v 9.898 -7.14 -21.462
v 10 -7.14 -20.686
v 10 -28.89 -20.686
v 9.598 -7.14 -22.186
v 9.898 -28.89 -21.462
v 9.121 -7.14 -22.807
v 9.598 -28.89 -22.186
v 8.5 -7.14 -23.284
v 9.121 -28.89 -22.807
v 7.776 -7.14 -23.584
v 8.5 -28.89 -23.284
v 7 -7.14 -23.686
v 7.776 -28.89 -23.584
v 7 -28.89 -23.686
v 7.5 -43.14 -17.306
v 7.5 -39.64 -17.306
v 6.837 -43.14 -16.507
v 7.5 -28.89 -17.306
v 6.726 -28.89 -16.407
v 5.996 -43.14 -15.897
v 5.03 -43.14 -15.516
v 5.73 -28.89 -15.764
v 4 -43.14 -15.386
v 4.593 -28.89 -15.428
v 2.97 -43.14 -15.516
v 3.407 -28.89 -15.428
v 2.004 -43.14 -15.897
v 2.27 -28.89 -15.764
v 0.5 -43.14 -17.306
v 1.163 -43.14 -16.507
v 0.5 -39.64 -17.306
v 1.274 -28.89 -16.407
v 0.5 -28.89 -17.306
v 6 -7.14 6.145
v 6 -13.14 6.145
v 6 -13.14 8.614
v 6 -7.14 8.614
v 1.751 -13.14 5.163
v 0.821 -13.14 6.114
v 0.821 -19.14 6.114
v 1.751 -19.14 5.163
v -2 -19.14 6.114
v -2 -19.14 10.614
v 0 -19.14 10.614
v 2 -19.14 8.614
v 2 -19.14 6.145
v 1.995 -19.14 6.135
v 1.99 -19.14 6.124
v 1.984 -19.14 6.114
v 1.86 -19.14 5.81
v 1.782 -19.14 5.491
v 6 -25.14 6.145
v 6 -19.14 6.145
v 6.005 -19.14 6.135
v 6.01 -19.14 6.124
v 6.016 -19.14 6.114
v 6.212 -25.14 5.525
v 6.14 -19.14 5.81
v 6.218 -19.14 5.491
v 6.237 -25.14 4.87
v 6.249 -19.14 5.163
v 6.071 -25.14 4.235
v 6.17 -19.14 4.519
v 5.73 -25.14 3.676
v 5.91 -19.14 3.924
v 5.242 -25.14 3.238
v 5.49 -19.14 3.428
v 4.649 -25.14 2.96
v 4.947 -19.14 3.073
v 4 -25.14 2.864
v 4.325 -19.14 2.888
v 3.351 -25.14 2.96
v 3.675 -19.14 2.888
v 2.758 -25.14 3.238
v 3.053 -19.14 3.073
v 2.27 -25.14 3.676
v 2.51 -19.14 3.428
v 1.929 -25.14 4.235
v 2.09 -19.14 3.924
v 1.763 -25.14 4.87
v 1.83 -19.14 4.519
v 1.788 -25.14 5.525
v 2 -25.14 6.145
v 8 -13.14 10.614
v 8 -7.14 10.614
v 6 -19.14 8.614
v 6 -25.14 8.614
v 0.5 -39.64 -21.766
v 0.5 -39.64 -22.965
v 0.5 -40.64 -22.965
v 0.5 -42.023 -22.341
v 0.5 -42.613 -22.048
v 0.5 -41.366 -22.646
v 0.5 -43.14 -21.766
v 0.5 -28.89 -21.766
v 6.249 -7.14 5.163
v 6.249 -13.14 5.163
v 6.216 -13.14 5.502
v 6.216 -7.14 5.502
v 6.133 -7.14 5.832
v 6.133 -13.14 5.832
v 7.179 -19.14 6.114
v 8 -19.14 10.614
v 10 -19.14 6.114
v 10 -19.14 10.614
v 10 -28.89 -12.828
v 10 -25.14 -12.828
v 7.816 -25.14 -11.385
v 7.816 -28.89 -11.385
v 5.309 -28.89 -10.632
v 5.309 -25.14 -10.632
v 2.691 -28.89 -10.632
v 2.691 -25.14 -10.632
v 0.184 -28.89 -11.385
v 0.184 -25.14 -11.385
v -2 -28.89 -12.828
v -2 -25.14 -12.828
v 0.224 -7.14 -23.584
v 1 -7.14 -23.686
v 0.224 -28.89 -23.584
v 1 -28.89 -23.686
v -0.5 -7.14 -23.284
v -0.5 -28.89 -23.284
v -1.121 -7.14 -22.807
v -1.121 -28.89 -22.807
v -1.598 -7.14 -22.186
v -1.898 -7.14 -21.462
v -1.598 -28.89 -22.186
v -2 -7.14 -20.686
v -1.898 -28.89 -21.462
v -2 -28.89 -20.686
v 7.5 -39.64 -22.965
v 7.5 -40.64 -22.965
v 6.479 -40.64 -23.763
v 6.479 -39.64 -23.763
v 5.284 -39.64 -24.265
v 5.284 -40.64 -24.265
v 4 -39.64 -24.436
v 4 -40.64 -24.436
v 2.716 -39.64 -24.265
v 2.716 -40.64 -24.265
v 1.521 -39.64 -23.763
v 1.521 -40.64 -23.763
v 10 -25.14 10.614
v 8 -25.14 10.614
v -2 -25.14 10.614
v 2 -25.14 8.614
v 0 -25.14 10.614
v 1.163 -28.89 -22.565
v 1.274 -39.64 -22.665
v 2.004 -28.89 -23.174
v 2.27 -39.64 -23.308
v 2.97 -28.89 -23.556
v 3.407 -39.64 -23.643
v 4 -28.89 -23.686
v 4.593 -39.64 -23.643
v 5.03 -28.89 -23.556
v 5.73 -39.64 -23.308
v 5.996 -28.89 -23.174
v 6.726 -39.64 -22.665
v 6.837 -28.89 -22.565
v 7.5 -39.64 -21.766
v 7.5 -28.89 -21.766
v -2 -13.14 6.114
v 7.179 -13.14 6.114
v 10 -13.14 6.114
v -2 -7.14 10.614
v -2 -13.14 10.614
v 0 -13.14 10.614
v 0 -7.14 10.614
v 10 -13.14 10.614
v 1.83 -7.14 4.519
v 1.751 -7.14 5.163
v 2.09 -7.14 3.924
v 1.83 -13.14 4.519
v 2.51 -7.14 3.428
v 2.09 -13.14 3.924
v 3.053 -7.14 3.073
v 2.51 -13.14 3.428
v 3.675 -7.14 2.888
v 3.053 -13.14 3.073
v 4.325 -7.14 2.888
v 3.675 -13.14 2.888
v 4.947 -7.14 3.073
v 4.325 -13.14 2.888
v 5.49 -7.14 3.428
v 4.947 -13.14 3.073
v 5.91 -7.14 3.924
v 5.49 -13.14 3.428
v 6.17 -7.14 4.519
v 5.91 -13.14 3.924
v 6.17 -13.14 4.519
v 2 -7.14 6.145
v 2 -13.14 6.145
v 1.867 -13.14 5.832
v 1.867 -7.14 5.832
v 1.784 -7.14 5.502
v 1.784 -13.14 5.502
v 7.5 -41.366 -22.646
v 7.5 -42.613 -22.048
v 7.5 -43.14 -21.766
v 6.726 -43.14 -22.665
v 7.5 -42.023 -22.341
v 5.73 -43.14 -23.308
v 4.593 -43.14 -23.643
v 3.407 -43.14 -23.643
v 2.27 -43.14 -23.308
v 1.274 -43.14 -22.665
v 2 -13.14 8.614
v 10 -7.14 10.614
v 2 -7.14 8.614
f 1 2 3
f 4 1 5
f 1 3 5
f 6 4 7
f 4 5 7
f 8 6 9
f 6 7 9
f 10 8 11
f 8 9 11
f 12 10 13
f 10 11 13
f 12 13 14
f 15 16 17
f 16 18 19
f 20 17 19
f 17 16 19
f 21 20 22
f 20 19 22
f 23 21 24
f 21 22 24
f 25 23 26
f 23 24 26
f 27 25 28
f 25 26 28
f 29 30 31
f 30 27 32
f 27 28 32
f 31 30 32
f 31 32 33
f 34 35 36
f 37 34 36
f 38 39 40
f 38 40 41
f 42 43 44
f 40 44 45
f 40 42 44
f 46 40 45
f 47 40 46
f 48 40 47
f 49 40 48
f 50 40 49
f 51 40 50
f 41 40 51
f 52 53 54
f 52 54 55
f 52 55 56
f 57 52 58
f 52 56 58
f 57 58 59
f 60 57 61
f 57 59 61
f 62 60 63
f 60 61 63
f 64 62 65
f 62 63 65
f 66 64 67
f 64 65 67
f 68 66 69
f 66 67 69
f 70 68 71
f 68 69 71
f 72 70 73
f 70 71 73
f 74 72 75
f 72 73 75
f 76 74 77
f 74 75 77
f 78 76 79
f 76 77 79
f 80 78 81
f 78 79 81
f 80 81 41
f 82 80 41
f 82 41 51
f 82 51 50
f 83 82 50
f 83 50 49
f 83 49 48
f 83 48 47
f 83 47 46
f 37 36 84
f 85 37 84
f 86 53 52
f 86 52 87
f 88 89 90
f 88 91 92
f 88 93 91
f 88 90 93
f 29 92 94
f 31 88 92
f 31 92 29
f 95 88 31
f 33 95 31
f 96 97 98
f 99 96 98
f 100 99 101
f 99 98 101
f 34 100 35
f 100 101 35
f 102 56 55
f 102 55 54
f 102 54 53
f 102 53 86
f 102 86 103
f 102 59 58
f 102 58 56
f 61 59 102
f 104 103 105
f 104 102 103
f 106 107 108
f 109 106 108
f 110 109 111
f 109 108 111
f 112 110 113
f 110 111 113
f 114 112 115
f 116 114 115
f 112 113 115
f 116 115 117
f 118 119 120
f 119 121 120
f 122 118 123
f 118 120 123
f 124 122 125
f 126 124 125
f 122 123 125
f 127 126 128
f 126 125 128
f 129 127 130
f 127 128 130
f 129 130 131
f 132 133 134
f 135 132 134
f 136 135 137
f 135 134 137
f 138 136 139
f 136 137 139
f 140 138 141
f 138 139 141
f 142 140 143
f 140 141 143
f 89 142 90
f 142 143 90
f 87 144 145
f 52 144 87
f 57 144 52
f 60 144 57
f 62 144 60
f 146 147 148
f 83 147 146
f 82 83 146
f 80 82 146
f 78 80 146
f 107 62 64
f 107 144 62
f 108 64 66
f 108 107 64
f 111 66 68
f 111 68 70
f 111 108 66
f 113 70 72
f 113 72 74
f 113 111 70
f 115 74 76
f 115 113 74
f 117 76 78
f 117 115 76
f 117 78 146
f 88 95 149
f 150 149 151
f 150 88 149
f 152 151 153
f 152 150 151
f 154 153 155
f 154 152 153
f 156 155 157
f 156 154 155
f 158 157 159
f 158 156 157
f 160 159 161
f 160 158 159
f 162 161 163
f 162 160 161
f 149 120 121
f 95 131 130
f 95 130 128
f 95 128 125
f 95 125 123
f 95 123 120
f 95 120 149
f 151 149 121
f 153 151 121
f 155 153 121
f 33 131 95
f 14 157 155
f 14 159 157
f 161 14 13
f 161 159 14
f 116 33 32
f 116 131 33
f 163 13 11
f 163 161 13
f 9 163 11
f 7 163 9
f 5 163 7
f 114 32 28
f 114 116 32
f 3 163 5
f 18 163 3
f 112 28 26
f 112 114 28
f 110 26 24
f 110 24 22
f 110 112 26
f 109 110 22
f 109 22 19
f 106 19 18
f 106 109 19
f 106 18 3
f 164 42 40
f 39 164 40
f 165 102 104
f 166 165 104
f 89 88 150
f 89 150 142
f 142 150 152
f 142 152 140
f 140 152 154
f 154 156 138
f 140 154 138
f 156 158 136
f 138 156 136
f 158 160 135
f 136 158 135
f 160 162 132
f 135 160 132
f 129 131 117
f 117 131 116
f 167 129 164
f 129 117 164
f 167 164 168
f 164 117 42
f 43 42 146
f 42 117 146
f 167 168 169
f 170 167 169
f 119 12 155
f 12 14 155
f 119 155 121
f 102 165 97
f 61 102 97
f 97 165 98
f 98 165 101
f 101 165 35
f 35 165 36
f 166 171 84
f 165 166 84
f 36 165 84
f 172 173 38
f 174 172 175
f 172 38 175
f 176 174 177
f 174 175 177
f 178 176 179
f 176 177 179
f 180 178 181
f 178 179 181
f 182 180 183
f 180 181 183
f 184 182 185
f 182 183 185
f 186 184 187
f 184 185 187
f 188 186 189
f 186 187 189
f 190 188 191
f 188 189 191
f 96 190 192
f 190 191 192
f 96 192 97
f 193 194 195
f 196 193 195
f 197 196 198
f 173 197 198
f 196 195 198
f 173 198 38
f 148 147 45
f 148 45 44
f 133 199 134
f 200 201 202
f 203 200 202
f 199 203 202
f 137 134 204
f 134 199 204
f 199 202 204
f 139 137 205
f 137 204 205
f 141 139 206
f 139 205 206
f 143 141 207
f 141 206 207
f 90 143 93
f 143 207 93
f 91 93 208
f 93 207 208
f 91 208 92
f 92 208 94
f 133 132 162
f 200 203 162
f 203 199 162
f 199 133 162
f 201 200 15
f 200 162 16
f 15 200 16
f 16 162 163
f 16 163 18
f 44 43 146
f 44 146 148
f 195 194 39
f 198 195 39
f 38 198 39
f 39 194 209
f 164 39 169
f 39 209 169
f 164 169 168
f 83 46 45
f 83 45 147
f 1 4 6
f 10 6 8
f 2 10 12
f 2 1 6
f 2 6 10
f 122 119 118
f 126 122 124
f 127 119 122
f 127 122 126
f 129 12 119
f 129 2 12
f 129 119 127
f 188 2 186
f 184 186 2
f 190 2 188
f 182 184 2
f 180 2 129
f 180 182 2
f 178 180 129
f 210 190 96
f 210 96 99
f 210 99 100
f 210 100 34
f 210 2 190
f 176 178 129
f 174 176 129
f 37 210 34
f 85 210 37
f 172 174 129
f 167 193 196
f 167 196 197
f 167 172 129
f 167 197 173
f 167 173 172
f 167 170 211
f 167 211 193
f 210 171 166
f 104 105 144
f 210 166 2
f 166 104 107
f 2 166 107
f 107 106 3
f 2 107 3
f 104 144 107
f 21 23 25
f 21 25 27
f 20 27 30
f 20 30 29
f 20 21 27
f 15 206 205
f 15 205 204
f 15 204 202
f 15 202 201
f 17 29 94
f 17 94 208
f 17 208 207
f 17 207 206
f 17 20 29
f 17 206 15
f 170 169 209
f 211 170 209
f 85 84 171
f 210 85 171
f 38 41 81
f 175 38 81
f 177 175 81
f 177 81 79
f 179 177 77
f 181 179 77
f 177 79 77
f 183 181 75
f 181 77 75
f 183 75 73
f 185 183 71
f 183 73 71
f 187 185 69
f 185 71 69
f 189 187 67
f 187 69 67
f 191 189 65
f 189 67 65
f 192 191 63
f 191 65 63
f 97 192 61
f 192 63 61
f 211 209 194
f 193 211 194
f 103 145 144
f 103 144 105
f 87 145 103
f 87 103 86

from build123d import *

# Parameters (mm, degrees)
F0_W         = 6
F0_H         = 18
F1_DEPTH     = 8
F3_DEPTH     = 18
F4_DEPTH     = 6
F5_DEPTH     = 4.2
F10_DEPTH    = 6
F11_R        = 2.25
F13_DEPTH    = 25
F14_W        = 4
F14_H        = 4.5
F15_DEPTH    = 25
F16_W        = 2.5
F16_H        = 17.5837995484
F16_W_2      = 3.5
F17_DEPTH    = 18.001
F18_W        = 2
F18_H        = 6
F19_DEPTH    = 30
F21_DEPTH    = 6
F23_DEPTH    = 3.75
F24_R        = 3
F26_DEPTH    = 25
F27_DEPTH    = 2
F28_T1_DEPTH = 16.2867319519
F30_DEPTH    = 6
F31_T1_DEPTH = 9.0166310888
F33_DEPTH    = 6


# Not quite as in the source:
# - a fillet or chamfer that OpenCascade refuses, or shapes differently, is made with other operations: its cross-section is extruded or revolved along the edge and cut away or added


with BuildPart() as f1:
    # F0 (on Right) → F1 (new body)
    with BuildSketch(Plane.YZ):
        with Locations((-22.1395939865, -6.3859075308)):
            Rectangle(F0_W, F0_H)
    extrude(amount=F1_DEPTH)


with BuildPart() as f3:
    # F2 (on face) → F3 (new body)
    with BuildSketch(Plane.XZ.offset(25.1395939865)):
        with BuildLine():
            ThreePointArc((4, -15.3859075308), (1.0655068581, -22.4704006727), (8.15, -19.5359075308))
            ThreePointArc((8.15, -19.5359075308), (6.9344931419, -16.6014143889), (4, -15.3859075308))
        make_face()
    extrude(amount=F3_DEPTH)


with BuildPart() as f4:
    # F4 (new, through all): a face of the model
    f4_faces = [f3.part.faces().sort_by_distance(p)[0] for p in [
        (4, -25.1395939865, -19.5359075308),
    ]]
    extrude(f4_faces, amount=F4_DEPTH)


with BuildPart() as f5:
    # F5 (new): a face of the model
    f5_faces = [f1.part.faces().sort_by_distance(p)[0] for p in [
        (4, -22.1395939865, -15.3859075308),
    ]]
    extrude(f5_faces, amount=F5_DEPTH)


with BuildPart() as f3_1:
    add(f3.part)

    # F6: union F4, F5, F1
    add(f4.part)
    add(f5.part)
    add(f1.part)

    # F8 (on mid) → F9 (revolve)
    with BuildSketch(Plane.YZ.offset(4)):
        Polygon((-43.1395939865, -15.3859075308), (-39.6395939865, -15.3859075308), (-39.6395939865, -14.6359075308), (-40.6395939865, -14.6359075308), align=None)
    revolve(axis=Axis((4, -25.1395939865, -19.5359075308), (0, 1, 0)))


with BuildPart() as f10:
    # F10 (new): a face of the model
    f10_faces = [f3_1.part.faces().sort_by_distance(p)[0] for p in [
        (4, -22.1395939865, 2.6140924692),
    ]]
    extrude(f10_faces, amount=F10_DEPTH)

    # F12: union F3
    add(f3_1.part)

    # F11 (on face) → F13 (cut)
    with BuildSketch(Plane(origin=(0, -19.1395939865, 0), x_dir=(-1, 0, 0), z_dir=(0, 1, 0))):
        with Locations((-4, 5.1140924692)):
            Circle(F11_R)
    extrude(amount=-F13_DEPTH, mode=Mode.SUBTRACT)

    # F14 (on face) → F15 (cut)
    with BuildSketch(Plane(origin=(0, -19.1395939865, 0), x_dir=(-1, 0, 0), z_dir=(0, 1, 0))):
        with Locations((-4, 7.3640924692)):
            Rectangle(F14_W, F14_H)
    extrude(amount=-F15_DEPTH, mode=Mode.SUBTRACT)

    # F16 (on face) → F17 (cut, through all)
    with BuildSketch(Plane.XZ.offset(25.1395939865)):
        with Locations((-0.75, -18.0519367568)):
            Rectangle(F16_W, F16_H)
        with Locations((9.25, -18.0519367568)):
            Rectangle(F16_W_2, F16_H)
    extrude(amount=F17_DEPTH, mode=Mode.SUBTRACT)

    # F18 (on face) → F19 (join)
    with BuildSketch(Plane.XY.offset(8.6140924692)):
        with Locations((-1, -22.1395939865)):
            Rectangle(F18_W, F18_H)
        with Locations((9, -22.1395939865)):
            Rectangle(F18_W, F18_H)
    extrude(amount=-F19_DEPTH)

    # F20 (on face) → F21 (join, through all)
    with BuildSketch(Plane(origin=(0, -19.1395939865, 0), x_dir=(-1, 0, 0), z_dir=(0, 1, 0))):
        with BuildLine():
            Line((-8, -21.3859075308), (-10, -21.3859075308))
            Line((-10, -21.3859075308), (-10, -23.6859075308))
            Line((-10, -23.6859075308), (-4, -23.6859075308))
            ThreePointArc((-4, -23.6859075308), (-6.5133623932, -22.8382566159), (-8, -20.6415747502))
            Line((-8, -20.6415747502), (-8, -21.3859075308))
        make_face()
        with BuildLine():
            Line((2, -23.6859075308), (2, -21.3859075308))
            Line((2, -21.3859075308), (0, -21.3859075308))
            Line((0, -21.3859075308), (0, -20.6415747502))
            ThreePointArc((0, -20.6415747502), (-1.4866376068, -22.8382566159), (-4, -23.6859075308))
            Line((-4, -23.6859075308), (2, -23.6859075308))
        make_face()
        with BuildLine():
            Line((2, -13.6859075308), (-10, -13.6859075308))
            Line((-10, -13.6859075308), (-10, -21.3859075308))
            Line((-10, -21.3859075308), (-8, -21.3859075308))
            Line((-8, -21.3859075308), (-8, -20.6415747502))
            ThreePointArc((-8, -20.6415747502), (-6.5133623932, -22.8382566159), (-4, -23.6859075308))
            ThreePointArc((-4, -23.6859075308), (-1.4866376068, -22.8382566159), (0, -20.6415747502))
            Line((0, -20.6415747502), (0, -21.3859075308))
            Line((0, -21.3859075308), (2, -21.3859075308))
            Line((2, -21.3859075308), (2, -13.6859075308))
        make_face()
    extrude(amount=-F21_DEPTH)

    # F22 (on face) → F23 (join)
    with BuildSketch(Plane.XZ.offset(25.1395939865)):
        with BuildLine():
            Line((10, -23.6859075308), (10, -12.8277035983))
            ThreePointArc((10, -12.8277035983), (4, -10.5359075308), (-2, -12.8277035983))
            Line((-2, -12.8277035983), (-2, -23.6859075308))
            Line((-2, -23.6859075308), (10, -23.6859075308))
        make_face()
    extrude(amount=F23_DEPTH)

    # F24
    f24_edges = [f10.edges().sort_by_distance(p)[0] for p in [
        (-2, -24.014594, -23.685908),
        (10, -24.014594, -23.685908),
    ]]
    fillet(f24_edges, radius=F24_R)

    # F25 (on face) → F26 (cut)
    with BuildSketch(Plane.XZ.offset(28.8895939865)):
        with BuildLine():
            ThreePointArc((-0.15, -19.5359075308), (4, -15.3859075308), (8.15, -19.5359075308))
            Line((8.15, -19.5359075308), (10, -19.5359075308))
            Line((10, -19.5359075308), (10, -10.5359075308))
            Line((10, -10.5359075308), (-2, -10.5359075308))
            Line((-2, -10.5359075308), (-2, -19.5359075308))
            Line((-2, -19.5359075308), (-0.15, -19.5359075308))
        make_face()
    extrude(amount=F26_DEPTH, mode=Mode.SUBTRACT)

    # F27 (add): faces of the model
    f27_faces = [f10.faces().sort_by_distance(p)[0] for p in [
        (0, -22.1395939865, 8.6140924692),
        (8, -22.1395939865, 8.6140924692),
    ]]
    extrude(f27_faces, amount=F27_DEPTH)

    # F28: chamfer of 2 on 4 edges, made by hand

    # F28_s2 → F28_t1 (cut)
    with BuildSketch(Plane.XZ.offset(13.9962280105)):
        Polygon((8, 10.6140924692), (6, 8.6140924692), (6, 10.6140924692), align=None)
        Polygon((2, 8.6140924692), (0, 10.6140924692), (2, 10.6140924692), align=None)
    extrude(amount=F28_T1_DEPTH, mode=Mode.SUBTRACT)

    # F29 (on face) → F30 (join)
    with BuildSketch(Plane(origin=(0, -19.1395939865, 0), x_dir=(-1, 0, 0), z_dir=(0, 1, 0))):
        with BuildLine():
            Line((-6.0155644371, 6.1140924692), (-10, 6.1140924692))
            Line((-10, 6.1140924692), (-10, -20.6859075308))
            ThreePointArc((-10, -20.6859075308), (-9.1213203436, -22.8072278743), (-7, -23.6859075308))
            Line((-7, -23.6859075308), (-1, -23.6859075308))
            ThreePointArc((-1, -23.6859075308), (1.1213203436, -22.8072278743), (2, -20.6859075308))
            Line((2, -20.6859075308), (2, 6.1140924692))
            Line((2, 6.1140924692), (-1.9844355629, 6.1140924692))
            ThreePointArc((-1.9844355629, 6.1140924692), (-4, 2.8640924692), (-6.0155644371, 6.1140924692))
        make_face()
    extrude(amount=F30_DEPTH)

    # F31: chamfer of 1.5 on 2 edges, made by hand

    # F31_s2 → F31_t1 (cut)
    with BuildSketch(Plane.XZ.offset(10.1229628977)):
        with BuildLine():
            Line((7.2214544106, 6.1569815348), (6.2075003037, 5.1205433408))
            Line((6.2075003037, 5.1205433408), (6.1775075177, 5.119885475))
            ThreePointArc((6.1775075177, 5.119885475), (6.1595192188, 5.6287542453), (5.9886902446, 6.1007591359))
            Line((5.9886902446, 6.1007591359), (6.0155644371, 6.1440924692))
            ThreePointArc((6.0155644371, 6.1440924692), (6.6185094238, 6.1440924692), (7.2214544106, 6.1869815348))
            Line((7.2214544106, 6.1869815348), (7.2214544106, 6.1569815348))
        make_face()
        with BuildLine():
            Line((0.7785455894, 6.1569815348), (1.7924996963, 5.1205433408))
            Line((1.7924996963, 5.1205433408), (1.8224924823, 5.119885475))
            ThreePointArc((1.8224924823, 5.119885475), (1.8404807812, 5.6287542453), (2.0113097554, 6.1007591359))
            Line((2.0113097554, 6.1007591359), (1.9844355629, 6.1440924692))
            ThreePointArc((1.9844355629, 6.1440924692), (1.3814905762, 6.1440924692), (0.7785455894, 6.1869815348))
            Line((0.7785455894, 6.1869815348), (0.7785455894, 6.1569815348))
        make_face()
    extrude(amount=F31_T1_DEPTH, mode=Mode.SUBTRACT)

    # F32 (on face) → F33 (join)
    with BuildSketch(Plane(origin=(0, -13.1395939865, 0), x_dir=(-1, 0, 0), z_dir=(0, 1, 0))):
        with BuildLine():
            ThreePointArc((-2, 6.1448688756), (-1.8193396117, 5.668367014), (-1.7505410494, 5.1634324064))
            Line((-1.7505410494, 5.1634324064), (-0.8205042363, 6.1140924692))
            Line((-0.8205042363, 6.1140924692), (2, 6.1140924692))
            Line((2, 6.1140924692), (2, 10.6140924692))
            Line((2, 10.6140924692), (0, 10.6140924692))
            Line((0, 10.6140924692), (-2, 8.6140924692))
            Line((-2, 8.6140924692), (-2, 6.1448688756))
        make_face()
        with BuildLine():
            Line((-8, 10.6140924692), (-10, 10.6140924692))
            Line((-10, 10.6140924692), (-10, 6.1140924692))
            Line((-10, 6.1140924692), (-7.1794957637, 6.1140924692))
            Line((-7.1794957637, 6.1140924692), (-6.2494589506, 5.1634324064))
            ThreePointArc((-6.2494589506, 5.1634324064), (-6.1806603883, 5.668367014), (-6, 6.1448688756))
            Line((-6, 6.1448688756), (-6, 8.6140924692))
            Line((-6, 8.6140924692), (-8, 10.6140924692))
        make_face()
        with BuildLine():
            Line((-7.1794957637, 6.1140924692), (-10, 6.1140924692))
            Line((-10, 6.1140924692), (-10, -12.8277035983))
            Line((-10, -12.8277035983), (-10, -20.6859075308))
            ThreePointArc((-10, -20.6859075308), (-9.1213203436, -22.8072278743), (-7, -23.6859075308))
            Line((-7, -23.6859075308), (-1, -23.6859075308))
            ThreePointArc((-1, -23.6859075308), (1.1213203436, -22.8072278743), (2, -20.6859075308))
            Line((2, -20.6859075308), (2, -12.8277035983))
            Line((2, -12.8277035983), (2, 6.1140924692))
            Line((2, 6.1140924692), (-0.8205042363, 6.1140924692))
            Line((-0.8205042363, 6.1140924692), (-1.7505410494, 5.1634324064))
            ThreePointArc((-1.7505410494, 5.1634324064), (-4, 2.8640924692), (-6.2494589506, 5.1634324064))
            Line((-6.2494589506, 5.1634324064), (-7.1794957637, 6.1140924692))
        make_face()
    extrude(amount=F33_DEPTH)


solid = f10.part
